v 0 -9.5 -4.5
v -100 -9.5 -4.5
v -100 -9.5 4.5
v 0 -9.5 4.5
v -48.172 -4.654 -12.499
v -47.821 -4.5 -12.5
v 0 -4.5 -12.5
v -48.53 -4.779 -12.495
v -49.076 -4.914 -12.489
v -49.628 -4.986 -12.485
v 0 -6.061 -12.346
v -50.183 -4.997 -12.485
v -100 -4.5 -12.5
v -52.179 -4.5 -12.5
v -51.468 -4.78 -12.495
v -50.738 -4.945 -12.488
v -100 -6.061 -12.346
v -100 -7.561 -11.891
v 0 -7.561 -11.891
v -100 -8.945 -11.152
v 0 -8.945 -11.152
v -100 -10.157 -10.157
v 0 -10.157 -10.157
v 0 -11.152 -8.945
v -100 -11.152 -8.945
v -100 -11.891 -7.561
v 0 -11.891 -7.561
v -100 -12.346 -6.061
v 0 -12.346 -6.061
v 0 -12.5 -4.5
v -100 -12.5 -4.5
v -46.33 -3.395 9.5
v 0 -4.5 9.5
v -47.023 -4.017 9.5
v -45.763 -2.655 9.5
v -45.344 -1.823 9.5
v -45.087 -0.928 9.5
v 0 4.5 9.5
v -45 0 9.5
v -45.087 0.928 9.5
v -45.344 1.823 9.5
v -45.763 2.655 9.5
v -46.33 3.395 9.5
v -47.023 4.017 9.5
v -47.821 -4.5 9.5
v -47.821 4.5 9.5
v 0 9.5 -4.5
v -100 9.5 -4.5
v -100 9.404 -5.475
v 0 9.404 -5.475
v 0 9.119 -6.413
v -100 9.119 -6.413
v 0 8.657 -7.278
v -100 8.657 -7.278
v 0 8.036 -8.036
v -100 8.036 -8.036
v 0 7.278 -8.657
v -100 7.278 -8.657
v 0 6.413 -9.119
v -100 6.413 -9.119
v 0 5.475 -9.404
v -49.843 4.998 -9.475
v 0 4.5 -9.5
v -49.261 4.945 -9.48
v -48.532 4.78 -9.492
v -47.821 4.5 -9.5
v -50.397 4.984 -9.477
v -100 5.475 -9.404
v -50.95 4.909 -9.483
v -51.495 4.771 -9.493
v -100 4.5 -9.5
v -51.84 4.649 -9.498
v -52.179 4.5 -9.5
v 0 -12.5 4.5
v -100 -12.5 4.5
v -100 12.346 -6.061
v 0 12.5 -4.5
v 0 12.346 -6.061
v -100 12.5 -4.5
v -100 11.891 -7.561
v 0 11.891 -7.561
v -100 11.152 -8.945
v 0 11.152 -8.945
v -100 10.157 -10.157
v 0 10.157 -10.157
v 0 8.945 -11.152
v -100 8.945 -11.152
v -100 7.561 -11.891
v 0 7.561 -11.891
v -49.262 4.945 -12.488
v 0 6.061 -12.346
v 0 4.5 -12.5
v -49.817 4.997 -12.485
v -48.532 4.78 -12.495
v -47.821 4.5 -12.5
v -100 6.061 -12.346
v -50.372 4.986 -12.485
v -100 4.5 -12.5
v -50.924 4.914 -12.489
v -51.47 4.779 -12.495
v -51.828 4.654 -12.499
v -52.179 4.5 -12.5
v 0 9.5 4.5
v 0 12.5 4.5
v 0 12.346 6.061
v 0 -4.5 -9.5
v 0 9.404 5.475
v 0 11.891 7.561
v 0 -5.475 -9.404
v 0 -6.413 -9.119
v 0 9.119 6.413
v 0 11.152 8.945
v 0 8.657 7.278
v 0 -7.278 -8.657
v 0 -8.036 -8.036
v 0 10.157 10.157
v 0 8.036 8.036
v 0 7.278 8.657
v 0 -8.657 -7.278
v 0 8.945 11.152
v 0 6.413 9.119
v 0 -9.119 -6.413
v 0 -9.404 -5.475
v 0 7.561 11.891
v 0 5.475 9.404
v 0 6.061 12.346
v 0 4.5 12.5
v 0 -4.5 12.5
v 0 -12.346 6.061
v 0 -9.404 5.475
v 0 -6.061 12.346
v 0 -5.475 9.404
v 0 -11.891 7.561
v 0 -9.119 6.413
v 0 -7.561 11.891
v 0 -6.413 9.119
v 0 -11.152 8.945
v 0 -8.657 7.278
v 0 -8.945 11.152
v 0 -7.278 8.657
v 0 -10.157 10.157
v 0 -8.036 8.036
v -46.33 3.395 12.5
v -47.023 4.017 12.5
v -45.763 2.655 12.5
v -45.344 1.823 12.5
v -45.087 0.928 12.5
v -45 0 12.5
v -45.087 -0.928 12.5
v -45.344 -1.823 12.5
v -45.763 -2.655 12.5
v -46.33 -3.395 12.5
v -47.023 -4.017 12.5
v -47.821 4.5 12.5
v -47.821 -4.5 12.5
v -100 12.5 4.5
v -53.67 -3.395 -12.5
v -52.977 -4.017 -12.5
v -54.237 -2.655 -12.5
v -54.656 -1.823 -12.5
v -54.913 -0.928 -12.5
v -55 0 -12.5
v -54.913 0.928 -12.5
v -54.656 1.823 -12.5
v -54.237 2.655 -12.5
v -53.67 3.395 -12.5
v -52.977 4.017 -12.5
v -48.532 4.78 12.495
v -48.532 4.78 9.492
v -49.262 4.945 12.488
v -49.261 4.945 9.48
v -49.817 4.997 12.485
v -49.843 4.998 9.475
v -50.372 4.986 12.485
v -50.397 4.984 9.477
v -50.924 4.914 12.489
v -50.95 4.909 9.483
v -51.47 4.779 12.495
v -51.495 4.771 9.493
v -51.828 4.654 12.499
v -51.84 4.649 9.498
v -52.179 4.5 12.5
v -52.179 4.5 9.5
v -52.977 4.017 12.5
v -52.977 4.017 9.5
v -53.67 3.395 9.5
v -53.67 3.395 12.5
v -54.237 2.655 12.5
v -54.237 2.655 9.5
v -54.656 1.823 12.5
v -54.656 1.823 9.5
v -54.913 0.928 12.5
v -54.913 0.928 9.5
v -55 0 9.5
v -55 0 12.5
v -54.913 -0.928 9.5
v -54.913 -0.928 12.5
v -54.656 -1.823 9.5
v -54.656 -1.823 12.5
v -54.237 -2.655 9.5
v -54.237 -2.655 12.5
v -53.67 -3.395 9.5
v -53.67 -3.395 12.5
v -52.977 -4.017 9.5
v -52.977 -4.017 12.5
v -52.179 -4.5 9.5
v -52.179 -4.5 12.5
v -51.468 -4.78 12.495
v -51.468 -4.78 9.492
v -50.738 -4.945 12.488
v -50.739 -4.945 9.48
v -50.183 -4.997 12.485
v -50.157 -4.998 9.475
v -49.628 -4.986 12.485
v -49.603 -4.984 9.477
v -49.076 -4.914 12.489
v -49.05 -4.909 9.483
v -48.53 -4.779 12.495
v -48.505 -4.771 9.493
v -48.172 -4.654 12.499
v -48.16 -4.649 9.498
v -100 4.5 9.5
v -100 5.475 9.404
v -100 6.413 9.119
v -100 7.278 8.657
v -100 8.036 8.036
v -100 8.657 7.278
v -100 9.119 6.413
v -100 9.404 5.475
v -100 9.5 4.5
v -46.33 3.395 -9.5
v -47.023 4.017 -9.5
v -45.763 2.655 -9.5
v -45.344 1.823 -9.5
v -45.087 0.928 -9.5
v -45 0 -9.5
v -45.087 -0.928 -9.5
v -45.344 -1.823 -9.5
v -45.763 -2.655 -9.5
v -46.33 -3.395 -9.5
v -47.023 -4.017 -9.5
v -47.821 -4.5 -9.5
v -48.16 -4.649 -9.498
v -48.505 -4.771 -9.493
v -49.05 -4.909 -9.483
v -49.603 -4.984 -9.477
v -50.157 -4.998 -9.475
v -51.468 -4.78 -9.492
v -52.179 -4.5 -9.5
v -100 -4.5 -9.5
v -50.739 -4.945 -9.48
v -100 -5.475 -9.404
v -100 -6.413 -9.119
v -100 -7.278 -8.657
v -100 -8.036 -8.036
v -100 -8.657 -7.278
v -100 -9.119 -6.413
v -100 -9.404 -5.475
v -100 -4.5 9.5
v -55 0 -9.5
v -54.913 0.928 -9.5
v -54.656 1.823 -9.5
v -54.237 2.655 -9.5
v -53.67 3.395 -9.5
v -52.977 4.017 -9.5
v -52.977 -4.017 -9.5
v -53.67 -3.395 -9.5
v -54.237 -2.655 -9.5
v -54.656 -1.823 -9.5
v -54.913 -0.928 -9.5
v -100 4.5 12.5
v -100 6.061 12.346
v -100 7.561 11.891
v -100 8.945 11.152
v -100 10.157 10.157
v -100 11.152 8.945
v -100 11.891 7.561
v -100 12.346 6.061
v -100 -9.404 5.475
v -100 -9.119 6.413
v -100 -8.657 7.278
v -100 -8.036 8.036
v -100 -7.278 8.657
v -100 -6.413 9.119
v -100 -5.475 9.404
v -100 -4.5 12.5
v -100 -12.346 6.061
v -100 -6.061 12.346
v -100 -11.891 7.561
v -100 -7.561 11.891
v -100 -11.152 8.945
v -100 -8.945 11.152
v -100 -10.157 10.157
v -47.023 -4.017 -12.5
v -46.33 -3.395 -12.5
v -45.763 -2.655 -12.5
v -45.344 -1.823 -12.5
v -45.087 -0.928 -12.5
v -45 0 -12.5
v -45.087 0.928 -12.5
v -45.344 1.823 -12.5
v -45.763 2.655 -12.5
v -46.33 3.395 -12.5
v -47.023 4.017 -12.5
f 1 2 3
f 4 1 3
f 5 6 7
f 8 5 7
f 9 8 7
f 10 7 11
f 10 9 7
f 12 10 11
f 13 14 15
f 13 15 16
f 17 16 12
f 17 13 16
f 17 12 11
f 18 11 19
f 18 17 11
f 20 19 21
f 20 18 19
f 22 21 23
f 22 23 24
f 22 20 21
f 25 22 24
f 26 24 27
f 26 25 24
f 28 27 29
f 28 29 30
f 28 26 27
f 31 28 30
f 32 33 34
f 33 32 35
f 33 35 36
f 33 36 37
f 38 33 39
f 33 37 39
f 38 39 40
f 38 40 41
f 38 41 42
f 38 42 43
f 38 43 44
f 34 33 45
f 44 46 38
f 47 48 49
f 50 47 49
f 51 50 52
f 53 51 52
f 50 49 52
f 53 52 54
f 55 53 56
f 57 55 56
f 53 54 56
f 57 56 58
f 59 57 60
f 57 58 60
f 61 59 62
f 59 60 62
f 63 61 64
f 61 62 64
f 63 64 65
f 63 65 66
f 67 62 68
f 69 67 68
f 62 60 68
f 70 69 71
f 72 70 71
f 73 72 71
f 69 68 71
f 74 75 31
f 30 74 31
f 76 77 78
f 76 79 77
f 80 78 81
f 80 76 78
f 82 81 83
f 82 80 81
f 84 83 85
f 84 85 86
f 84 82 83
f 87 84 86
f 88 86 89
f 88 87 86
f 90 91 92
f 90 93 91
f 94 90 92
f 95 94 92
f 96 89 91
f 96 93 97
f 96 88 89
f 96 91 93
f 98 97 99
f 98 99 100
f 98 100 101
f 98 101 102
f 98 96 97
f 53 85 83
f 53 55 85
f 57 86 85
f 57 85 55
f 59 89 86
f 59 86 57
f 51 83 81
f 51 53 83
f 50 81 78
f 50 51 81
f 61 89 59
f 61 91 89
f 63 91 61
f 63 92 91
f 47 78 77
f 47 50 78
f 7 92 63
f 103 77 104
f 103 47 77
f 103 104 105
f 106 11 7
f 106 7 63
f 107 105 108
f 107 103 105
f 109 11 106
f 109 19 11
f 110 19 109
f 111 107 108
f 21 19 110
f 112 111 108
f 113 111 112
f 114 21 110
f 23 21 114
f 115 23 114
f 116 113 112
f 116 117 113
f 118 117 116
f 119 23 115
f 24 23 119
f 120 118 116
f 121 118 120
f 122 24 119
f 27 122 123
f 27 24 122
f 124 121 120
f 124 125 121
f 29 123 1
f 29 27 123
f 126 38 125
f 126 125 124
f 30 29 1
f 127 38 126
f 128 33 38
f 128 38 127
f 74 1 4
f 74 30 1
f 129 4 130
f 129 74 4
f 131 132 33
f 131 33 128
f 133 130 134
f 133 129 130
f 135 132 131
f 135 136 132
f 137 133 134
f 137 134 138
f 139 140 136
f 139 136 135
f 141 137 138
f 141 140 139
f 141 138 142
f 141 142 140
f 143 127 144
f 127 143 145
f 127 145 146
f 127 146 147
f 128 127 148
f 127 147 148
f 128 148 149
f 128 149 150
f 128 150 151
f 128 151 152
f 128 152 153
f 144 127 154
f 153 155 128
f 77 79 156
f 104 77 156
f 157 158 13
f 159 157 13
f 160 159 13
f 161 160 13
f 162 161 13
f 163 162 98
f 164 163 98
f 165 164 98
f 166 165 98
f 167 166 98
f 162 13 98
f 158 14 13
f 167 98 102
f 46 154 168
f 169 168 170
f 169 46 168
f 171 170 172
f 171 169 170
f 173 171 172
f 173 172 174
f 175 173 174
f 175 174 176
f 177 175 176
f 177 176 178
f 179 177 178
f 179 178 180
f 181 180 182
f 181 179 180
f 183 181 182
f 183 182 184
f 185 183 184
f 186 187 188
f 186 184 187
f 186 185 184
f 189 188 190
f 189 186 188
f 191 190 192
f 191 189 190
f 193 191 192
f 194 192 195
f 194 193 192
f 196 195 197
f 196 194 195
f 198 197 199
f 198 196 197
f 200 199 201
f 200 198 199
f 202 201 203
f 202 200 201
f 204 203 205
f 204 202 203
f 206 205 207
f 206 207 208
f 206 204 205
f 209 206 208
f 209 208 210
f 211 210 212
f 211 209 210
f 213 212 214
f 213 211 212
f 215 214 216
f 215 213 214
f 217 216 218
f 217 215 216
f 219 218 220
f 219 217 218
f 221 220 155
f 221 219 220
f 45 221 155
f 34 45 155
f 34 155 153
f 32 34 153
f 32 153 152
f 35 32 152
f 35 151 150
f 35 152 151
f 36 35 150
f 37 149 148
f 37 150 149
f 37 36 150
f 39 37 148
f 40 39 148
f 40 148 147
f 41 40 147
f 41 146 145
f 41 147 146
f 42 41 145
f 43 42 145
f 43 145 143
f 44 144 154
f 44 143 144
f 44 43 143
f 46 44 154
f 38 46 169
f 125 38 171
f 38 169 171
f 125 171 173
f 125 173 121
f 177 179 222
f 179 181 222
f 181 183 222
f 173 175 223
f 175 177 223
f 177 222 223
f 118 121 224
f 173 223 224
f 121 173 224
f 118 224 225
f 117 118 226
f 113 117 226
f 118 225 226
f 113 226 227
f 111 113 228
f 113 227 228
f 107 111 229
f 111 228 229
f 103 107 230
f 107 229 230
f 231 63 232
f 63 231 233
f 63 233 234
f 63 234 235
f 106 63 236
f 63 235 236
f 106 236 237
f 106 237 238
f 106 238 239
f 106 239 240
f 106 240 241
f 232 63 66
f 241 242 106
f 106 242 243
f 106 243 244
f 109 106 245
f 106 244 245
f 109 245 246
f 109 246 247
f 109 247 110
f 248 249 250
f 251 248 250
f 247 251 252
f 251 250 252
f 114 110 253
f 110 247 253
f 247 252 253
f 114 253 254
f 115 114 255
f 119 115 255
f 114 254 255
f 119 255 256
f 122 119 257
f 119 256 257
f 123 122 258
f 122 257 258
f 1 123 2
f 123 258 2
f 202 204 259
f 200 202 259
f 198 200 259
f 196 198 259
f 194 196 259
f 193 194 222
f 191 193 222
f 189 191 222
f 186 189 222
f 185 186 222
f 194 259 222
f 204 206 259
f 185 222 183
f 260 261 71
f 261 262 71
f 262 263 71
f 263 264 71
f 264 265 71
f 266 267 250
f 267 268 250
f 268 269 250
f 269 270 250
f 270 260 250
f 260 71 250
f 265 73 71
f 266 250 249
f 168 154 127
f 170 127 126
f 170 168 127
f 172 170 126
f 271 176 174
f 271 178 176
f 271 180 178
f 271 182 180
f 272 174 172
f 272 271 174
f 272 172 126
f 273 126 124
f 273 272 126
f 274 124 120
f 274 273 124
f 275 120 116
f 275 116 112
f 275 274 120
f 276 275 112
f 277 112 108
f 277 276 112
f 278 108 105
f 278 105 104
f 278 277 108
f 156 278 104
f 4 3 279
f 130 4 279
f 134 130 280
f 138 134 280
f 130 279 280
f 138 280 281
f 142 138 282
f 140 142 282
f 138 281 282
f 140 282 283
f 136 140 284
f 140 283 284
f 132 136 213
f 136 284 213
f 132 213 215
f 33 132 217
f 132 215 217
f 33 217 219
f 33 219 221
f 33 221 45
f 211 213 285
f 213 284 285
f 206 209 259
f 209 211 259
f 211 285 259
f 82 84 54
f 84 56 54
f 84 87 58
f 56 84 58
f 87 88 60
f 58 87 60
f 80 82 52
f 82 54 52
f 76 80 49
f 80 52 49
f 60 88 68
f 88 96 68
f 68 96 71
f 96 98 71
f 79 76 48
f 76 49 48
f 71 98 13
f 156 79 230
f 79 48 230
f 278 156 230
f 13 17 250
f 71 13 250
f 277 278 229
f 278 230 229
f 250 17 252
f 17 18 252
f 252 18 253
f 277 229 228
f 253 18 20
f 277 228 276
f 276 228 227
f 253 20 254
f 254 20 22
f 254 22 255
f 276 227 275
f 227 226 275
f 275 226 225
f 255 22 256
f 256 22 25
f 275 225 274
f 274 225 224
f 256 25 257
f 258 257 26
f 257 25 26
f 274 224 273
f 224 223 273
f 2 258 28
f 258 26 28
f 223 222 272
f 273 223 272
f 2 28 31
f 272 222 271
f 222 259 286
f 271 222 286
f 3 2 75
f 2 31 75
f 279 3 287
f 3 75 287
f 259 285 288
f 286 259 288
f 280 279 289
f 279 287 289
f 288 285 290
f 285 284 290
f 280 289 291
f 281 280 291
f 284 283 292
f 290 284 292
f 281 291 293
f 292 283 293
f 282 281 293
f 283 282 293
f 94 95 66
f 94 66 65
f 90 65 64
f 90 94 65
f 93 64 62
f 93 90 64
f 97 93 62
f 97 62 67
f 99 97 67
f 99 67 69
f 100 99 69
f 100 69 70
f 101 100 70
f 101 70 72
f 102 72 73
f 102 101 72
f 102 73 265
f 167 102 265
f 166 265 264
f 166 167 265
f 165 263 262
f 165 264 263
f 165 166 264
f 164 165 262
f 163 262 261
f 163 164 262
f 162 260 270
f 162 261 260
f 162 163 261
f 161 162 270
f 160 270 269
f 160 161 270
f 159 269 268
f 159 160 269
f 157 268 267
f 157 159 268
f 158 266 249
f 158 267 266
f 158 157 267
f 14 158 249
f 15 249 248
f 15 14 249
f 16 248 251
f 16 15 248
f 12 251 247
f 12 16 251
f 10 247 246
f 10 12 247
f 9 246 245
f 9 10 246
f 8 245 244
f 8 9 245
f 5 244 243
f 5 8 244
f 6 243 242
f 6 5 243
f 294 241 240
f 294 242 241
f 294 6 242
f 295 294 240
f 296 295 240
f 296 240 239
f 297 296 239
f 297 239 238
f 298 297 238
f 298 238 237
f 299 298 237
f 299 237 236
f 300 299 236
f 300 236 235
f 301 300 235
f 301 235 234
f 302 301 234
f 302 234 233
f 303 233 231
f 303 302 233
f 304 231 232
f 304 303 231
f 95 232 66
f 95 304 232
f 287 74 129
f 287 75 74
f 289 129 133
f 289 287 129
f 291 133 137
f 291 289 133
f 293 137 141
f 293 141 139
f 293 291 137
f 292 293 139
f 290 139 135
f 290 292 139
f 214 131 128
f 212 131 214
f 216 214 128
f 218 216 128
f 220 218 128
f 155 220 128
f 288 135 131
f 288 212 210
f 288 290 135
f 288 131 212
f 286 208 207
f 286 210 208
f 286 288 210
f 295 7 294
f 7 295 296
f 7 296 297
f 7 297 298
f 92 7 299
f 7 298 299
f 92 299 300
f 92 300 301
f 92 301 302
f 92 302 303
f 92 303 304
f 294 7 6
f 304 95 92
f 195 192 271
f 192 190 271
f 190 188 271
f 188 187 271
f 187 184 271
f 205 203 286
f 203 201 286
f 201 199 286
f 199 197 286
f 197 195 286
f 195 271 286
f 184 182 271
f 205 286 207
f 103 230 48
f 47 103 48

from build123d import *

# Parameters (mm, degrees)
CUT_EXTRUDE1_DEPTH      = 102.550480058
CUT_EXTRUDE1_DEPTH_BACK = 102.550480058
SKETCH3_R               = 5


with BuildPart() as part:
    # Sweep-Thin1: sweep along a path in Sketch1
    with BuildLine(Plane(origin=(0, 0, 0), x_dir=(1, 0, 0), z_dir=(0, 1, 0))) as sweep_thin1_path:
        Line((0, 0), (-100, 0))
    # Sketch2 → Sweep-Thin1 (sweep)
    with BuildSketch(Plane(origin=(0, 0, 0), x_dir=(0, 0, -1), z_dir=(1, 0, 0))):
        with BuildLine():
            Line((4.5, 12.5), (-4.5, 12.5))
            ThreePointArc((-4.5, 12.5), (-10.156854249, 10.156854249), (-12.5, 4.5))
            Line((-12.5, 4.5), (-12.5, -4.5))
            ThreePointArc((-12.5, -4.5), (-10.156854249, -10.156854249), (-4.5, -12.5))
            Line((-4.5, -12.5), (4.5, -12.5))
            ThreePointArc((4.5, -12.5), (10.156854249, -10.156854249), (12.5, -4.5))
            Line((12.5, -4.5), (12.5, 4.5))
            ThreePointArc((12.5, 4.5), (10.156854249, 10.156854249), (4.5, 12.5))
        make_face()
        with BuildLine():
            Line((4.5, 9.5), (-4.5, 9.5))
            ThreePointArc((-4.5, 9.5), (-8.035533906, 8.035533906), (-9.5, 4.5))
            Line((-9.5, 4.5), (-9.5, -4.5))
            ThreePointArc((-9.5, -4.5), (-8.035533906, -8.035533906), (-4.5, -9.5))
            Line((-4.5, -9.5), (4.5, -9.5))
            ThreePointArc((4.5, -9.5), (8.035533906, -8.035533906), (9.5, -4.5))
            Line((9.5, -4.5), (9.5, 4.5))
            ThreePointArc((9.5, 4.5), (8.035533906, 8.035533906), (4.5, 9.5))
        make_face(mode=Mode.SUBTRACT)
    sweep(path=sweep_thin1_path.line)

    # Sketch3 → Cut-Extrude1 (cut, two sides: drawn at the far end of the back side and taken through both)
    with BuildSketch(Plane.XY.offset(-CUT_EXTRUDE1_DEPTH_BACK)):
        with Locations(Location((-50, 0, 0), (0, 0, 64.158067237))):
            Circle(SKETCH3_R)
    extrude(amount=CUT_EXTRUDE1_DEPTH + CUT_EXTRUDE1_DEPTH_BACK, mode=Mode.SUBTRACT)


solid = part.part
